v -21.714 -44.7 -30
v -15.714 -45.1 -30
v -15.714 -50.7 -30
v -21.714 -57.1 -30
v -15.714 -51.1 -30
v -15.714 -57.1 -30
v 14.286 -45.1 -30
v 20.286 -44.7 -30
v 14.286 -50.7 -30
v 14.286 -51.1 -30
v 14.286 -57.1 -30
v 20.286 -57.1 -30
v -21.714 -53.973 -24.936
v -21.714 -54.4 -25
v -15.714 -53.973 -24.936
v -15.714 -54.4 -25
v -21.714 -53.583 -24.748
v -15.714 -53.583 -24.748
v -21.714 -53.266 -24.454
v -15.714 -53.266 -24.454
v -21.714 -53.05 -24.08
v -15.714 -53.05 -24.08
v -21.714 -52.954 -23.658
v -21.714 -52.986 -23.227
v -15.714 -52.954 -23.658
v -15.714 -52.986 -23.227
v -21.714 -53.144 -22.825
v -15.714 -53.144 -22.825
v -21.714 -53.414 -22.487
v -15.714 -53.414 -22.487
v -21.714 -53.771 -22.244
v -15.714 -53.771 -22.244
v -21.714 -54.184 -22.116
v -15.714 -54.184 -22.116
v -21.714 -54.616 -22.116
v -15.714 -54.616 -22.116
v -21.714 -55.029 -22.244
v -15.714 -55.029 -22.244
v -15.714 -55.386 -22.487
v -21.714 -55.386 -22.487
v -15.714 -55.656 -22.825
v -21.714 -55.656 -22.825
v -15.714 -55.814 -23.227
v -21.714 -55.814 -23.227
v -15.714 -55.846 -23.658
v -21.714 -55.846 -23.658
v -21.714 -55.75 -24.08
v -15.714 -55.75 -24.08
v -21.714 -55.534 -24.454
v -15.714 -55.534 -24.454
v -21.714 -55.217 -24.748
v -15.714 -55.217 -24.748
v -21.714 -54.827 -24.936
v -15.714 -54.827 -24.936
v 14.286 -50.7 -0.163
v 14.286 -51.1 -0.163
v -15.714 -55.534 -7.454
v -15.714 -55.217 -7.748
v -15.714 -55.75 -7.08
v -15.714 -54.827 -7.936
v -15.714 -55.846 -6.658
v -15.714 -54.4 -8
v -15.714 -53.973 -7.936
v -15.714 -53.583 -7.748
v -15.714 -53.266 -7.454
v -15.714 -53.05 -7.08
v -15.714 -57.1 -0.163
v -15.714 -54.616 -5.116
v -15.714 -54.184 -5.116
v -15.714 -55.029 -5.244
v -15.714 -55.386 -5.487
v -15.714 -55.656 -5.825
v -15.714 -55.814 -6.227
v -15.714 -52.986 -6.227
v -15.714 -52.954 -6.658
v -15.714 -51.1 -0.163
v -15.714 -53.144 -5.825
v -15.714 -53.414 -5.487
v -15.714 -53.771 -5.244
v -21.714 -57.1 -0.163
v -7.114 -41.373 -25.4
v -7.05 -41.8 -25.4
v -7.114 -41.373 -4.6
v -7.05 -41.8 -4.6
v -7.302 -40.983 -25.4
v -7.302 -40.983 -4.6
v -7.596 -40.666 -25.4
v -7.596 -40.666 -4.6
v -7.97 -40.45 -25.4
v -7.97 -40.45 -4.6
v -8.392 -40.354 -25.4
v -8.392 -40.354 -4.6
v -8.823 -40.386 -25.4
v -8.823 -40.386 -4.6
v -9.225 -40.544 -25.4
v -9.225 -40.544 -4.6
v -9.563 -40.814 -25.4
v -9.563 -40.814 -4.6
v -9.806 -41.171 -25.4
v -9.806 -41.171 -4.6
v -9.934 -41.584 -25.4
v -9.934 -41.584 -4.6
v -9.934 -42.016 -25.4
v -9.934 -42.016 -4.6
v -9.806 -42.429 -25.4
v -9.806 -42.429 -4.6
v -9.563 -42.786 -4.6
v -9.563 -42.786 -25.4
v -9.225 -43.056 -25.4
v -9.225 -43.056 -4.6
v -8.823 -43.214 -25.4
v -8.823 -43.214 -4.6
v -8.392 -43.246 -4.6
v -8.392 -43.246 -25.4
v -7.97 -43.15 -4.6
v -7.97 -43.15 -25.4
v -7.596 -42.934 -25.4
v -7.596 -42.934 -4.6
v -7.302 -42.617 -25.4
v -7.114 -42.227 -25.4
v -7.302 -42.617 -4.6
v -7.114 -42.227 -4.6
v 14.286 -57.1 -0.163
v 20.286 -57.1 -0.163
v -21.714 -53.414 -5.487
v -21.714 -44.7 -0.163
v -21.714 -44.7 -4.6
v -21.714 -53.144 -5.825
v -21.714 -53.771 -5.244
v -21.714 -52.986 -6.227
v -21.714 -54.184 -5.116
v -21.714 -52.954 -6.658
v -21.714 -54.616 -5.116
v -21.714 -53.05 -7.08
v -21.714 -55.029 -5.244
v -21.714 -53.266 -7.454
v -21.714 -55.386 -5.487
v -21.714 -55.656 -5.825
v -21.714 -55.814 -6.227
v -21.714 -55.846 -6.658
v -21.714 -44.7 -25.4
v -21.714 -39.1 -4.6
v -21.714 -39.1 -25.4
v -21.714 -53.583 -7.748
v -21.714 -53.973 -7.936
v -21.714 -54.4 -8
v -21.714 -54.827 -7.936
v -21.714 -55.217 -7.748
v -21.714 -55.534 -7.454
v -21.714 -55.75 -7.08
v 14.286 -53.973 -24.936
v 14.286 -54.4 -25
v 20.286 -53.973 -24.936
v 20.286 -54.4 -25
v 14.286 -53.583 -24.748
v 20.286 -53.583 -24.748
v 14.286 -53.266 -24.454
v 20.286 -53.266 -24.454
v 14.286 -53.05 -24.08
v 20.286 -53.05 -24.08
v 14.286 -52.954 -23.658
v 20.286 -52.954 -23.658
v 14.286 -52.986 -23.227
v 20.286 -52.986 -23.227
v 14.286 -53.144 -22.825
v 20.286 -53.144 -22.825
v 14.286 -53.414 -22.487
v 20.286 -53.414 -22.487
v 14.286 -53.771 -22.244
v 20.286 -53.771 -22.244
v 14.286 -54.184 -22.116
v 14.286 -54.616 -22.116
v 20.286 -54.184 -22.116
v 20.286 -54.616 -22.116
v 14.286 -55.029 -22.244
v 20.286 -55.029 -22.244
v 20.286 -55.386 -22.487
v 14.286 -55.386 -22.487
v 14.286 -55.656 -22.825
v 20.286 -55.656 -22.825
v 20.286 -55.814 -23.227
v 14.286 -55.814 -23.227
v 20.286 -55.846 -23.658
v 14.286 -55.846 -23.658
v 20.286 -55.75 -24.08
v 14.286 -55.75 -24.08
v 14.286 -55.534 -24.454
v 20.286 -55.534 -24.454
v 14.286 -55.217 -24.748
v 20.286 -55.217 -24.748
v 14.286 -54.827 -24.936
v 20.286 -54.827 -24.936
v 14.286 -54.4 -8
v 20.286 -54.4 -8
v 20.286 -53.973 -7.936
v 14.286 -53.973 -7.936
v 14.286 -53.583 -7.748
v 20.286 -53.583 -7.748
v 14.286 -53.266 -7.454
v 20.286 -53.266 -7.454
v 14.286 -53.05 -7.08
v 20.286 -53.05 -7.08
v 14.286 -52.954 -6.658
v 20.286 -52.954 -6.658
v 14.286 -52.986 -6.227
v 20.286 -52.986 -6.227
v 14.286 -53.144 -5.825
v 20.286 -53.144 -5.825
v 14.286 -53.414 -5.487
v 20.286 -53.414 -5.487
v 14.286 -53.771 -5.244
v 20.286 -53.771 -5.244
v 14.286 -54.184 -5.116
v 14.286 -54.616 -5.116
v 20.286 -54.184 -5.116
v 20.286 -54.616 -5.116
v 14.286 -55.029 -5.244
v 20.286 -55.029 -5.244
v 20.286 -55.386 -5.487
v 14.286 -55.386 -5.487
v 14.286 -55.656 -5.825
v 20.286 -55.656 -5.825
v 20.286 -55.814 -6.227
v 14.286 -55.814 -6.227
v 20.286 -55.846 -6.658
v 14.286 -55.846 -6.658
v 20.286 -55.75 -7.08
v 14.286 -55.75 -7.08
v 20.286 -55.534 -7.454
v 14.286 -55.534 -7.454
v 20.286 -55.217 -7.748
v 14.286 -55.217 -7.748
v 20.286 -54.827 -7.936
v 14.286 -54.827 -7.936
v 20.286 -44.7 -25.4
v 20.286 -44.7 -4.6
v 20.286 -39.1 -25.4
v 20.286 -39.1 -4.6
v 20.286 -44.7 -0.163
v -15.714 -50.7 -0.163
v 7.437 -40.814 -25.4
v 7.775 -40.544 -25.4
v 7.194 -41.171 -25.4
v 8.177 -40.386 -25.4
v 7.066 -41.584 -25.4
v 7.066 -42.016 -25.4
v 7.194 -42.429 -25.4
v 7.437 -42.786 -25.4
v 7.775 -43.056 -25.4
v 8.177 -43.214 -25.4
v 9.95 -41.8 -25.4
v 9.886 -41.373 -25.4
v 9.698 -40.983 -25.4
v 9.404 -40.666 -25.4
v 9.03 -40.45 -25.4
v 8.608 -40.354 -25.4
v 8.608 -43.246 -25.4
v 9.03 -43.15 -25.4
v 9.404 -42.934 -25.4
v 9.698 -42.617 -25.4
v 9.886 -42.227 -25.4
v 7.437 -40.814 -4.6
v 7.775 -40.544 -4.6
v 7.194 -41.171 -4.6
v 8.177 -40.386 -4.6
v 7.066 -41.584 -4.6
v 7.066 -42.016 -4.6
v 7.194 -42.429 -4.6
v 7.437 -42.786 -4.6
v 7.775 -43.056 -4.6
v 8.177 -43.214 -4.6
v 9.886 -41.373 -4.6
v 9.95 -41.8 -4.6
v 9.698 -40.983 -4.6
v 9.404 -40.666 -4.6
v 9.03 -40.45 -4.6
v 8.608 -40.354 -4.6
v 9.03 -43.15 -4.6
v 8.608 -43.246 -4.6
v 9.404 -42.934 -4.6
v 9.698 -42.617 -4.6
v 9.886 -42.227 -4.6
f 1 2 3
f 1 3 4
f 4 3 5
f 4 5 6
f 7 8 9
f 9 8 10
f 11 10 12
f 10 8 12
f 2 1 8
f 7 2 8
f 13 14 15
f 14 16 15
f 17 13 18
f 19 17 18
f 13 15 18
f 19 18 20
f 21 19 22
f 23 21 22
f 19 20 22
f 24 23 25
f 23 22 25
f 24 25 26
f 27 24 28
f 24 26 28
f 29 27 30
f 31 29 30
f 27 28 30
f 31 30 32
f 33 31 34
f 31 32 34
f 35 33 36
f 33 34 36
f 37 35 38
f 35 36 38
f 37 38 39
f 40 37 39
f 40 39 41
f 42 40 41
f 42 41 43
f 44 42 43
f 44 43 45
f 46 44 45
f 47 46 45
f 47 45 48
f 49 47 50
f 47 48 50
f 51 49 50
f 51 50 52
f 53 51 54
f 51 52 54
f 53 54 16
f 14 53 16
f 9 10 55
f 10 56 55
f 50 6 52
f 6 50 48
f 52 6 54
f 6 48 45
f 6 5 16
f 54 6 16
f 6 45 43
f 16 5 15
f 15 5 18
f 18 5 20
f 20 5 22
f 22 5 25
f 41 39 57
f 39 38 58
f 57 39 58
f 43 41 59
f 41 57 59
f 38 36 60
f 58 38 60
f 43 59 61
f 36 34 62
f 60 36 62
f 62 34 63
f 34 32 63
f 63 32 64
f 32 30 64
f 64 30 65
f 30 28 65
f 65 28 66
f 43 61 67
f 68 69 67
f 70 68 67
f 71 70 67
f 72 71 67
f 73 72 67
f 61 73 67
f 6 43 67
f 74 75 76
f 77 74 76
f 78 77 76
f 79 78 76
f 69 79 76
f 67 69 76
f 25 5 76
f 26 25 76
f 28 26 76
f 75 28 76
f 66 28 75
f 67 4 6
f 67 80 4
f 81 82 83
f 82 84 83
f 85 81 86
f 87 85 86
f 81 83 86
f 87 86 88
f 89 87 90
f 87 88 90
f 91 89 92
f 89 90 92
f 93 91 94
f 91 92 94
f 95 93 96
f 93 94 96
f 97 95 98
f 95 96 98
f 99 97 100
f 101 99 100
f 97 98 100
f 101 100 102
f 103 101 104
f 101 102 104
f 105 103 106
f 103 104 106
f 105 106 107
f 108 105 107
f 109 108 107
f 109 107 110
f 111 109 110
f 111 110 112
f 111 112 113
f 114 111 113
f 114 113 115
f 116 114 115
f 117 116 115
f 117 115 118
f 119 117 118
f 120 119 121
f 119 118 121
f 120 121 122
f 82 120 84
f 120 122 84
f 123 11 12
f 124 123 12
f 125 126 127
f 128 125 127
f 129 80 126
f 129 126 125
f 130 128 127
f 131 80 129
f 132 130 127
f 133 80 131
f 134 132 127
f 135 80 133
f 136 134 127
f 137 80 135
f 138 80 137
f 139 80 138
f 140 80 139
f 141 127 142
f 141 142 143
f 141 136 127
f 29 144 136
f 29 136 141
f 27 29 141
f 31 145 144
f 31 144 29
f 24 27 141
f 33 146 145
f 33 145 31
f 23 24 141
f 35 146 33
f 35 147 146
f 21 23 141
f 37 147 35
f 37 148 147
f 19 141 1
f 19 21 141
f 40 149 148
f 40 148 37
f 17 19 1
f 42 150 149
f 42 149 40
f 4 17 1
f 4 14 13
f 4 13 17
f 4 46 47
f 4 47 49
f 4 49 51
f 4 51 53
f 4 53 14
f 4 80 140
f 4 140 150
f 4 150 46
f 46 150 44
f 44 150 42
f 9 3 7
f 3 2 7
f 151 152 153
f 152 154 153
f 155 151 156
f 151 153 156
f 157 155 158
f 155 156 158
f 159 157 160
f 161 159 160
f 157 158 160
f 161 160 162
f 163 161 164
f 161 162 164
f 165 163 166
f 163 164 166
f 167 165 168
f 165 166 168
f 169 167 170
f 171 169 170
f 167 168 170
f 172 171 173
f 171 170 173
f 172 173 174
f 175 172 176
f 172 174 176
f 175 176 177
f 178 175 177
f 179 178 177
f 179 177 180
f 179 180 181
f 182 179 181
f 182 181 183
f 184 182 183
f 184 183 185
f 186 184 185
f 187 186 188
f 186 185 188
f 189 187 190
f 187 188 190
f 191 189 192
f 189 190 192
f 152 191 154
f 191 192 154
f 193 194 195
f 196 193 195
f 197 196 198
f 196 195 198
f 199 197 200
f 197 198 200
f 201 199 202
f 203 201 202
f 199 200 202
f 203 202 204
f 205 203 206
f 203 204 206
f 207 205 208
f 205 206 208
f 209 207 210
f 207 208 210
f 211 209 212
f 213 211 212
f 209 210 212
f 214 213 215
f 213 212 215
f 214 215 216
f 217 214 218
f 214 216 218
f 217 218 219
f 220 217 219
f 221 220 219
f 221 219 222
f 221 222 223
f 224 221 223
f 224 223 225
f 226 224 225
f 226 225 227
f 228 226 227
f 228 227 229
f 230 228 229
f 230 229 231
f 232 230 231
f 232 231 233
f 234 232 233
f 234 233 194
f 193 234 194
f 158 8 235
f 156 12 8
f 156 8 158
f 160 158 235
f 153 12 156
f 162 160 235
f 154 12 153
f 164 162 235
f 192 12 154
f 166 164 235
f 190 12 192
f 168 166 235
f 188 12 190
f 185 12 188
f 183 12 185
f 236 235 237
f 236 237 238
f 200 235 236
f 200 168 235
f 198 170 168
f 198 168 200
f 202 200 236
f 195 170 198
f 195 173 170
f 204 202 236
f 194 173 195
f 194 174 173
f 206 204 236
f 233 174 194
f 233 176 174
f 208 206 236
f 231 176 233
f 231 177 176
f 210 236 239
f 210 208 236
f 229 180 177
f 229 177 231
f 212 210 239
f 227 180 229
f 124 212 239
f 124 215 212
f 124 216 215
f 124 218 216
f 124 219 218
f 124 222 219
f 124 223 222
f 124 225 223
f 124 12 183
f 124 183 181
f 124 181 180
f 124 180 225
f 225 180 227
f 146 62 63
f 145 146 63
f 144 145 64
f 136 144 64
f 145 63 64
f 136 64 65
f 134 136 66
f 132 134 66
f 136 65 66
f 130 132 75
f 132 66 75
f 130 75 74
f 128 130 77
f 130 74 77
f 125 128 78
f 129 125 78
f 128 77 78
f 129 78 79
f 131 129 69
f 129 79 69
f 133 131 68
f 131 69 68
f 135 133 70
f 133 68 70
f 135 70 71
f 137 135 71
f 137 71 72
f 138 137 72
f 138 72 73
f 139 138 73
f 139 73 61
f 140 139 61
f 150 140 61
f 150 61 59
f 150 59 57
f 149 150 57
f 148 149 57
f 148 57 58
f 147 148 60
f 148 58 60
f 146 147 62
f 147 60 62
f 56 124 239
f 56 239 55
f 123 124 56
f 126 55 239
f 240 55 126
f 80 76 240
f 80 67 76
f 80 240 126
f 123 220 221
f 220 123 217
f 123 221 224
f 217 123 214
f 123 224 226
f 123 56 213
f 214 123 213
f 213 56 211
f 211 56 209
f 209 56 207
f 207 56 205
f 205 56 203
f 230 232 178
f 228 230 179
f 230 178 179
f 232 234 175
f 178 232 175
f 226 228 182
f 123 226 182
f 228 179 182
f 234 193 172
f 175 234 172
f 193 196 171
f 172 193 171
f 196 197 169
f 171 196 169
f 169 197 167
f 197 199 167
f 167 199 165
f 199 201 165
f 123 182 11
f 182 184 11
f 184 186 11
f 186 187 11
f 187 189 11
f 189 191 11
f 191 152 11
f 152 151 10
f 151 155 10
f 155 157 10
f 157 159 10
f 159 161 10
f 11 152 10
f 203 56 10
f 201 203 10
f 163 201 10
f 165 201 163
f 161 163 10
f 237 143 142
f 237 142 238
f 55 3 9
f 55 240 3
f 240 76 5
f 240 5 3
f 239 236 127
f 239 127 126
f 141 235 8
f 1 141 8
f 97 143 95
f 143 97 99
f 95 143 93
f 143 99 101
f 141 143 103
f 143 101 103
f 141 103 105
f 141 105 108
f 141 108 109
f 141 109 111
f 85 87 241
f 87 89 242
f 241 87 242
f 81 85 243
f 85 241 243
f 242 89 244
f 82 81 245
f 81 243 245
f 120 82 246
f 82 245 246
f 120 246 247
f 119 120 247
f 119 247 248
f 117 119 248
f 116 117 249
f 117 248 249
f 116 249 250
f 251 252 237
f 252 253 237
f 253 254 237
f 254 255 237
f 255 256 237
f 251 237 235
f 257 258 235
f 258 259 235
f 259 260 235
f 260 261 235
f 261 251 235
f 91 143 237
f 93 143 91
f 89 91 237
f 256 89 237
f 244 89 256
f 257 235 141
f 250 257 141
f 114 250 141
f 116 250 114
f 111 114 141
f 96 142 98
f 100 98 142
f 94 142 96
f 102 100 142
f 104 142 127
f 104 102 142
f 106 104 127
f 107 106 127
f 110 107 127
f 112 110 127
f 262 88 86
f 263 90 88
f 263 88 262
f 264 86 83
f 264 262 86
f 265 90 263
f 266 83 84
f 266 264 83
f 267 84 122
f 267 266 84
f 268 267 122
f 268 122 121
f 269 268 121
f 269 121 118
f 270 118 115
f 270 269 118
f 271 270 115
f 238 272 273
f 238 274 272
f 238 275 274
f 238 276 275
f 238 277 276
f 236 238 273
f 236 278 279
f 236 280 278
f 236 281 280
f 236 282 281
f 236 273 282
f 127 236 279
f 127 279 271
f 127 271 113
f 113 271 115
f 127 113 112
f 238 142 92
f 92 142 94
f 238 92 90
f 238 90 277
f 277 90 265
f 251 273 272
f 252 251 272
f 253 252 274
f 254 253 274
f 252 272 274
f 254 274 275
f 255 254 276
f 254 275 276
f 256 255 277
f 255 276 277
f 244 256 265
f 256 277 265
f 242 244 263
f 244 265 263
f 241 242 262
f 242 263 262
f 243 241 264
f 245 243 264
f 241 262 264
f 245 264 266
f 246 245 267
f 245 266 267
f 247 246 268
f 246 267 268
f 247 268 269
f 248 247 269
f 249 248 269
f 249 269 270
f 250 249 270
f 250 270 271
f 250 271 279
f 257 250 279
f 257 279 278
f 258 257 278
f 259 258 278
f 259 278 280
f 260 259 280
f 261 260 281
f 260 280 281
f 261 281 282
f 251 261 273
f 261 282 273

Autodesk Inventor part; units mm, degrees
ref_plane "YZ Plane" through (0, 0, 0) normal (1, 0, 0) x (0, 1, 0)
ref_plane "XZ Plane" through (0, 0, 0) normal (0, 1, 0) x (-1, 0, 0)
ref_plane "XY Plane" through (0, 0, 0) normal (0, 0, 1) x (1, 0, 0)
ref_plane "작업 평면1" through (0, 0, 0) normal (0, 0, 1) x (1, 0, 0)
sketch "스케치1" plane through (0, 0, 0) normal (0, 0, 1) x (1, 0, 0)
  line L0 (-12.7, 12) -> (-9.2, 12) projected
  line L1 (-12.7, 12) -> (-17.8, 6) projected
  line L2 (-17.8, 6) -> (-17.8, -32.6) projected
  line L3 (-17.8, -32.6) -> (-12.7, -38.6) projected
  line L4 (-12.7, -38.6) -> (12.7, -38.6) projected
  line L5 (12.7, -38.6) -> (17.8, -32.6) projected
  line L6 (17.8, -32.6) -> (17.8, 6) projected
  line L7 (17.8, 6) -> (12.7, 12) projected
  line L8 (9.2, 12) -> (12.7, 12) projected
  arc A0 (12.2, 9) -> (9.2, 12) centre (9.2, 9) ccw projected
  line L9 (12.2, -30) -> (12.2, 9) projected
  arc A1 (9.2, -33) -> (12.2, -30) centre (9.2, -30) ccw projected
  line L10 (-9.2, -33) -> (9.2, -33) projected
  arc A2 (-12.2, -30) -> (-9.2, -33) centre (-9.2, -30) ccw projected
  line L11 (-12.2, 9) -> (-12.2, -30) projected
  arc A3 (-9.2, 12) -> (-12.2, 9) centre (-9.2, 9) ccw projected
  circle A4 centre (-15, 4.5) radius 1.35 projected
  circle A5 centre (-15, -12.5) radius 1.35 projected
  circle A6 centre (-8.5, -35.8) radius 1.35 projected
  circle A7 centre (15, 4.5) radius 1.35 projected
  circle A8 centre (15, -12.5) radius 1.35 projected
  circle A9 centre (8.5, -35.8) radius 1.35 projected
  circle A10 centre (-15, -29.5) radius 1.35 projected
  circle A11 centre (15, -29.5) radius 1.35 projected
  arc A12 (9.2, -33.1) -> (12.3, -30) centre (9.2, -30) ccw
  line L12 (12.3, -30) -> (12.3, 9)
  arc A13 (12.3, 9) -> (10.2954, 11.9) centre (9.2, 9) ccw
  line L13 (10.2954, 11.9) -> (12.6538, 11.9)
  line L14 (12.6538, 11.9) -> (17.7, 5.9632)
  line L15 (17.7, 5.9632) -> (17.7, -32.5632)
  line L16 (17.7, -32.5632) -> (12.6538, -38.5)
  line L17 (12.6538, -38.5) -> (-12.6538, -38.5)
  line L18 (-12.6538, -38.5) -> (-17.7, -32.5632)
  line L19 (-17.7, -32.5632) -> (-17.7, 5.9632)
  line L20 (-17.7, 5.9632) -> (-12.6538, 11.9)
  line L21 (-12.6538, 11.9) -> (-10.2954, 11.9)
  arc A14 (-10.2954, 11.9) -> (-12.3, 9) centre (-9.2, 9) ccw
  line L22 (-12.3, 9) -> (-12.3, -30)
  arc A15 (-12.3, -30) -> (-9.2, -33.1) centre (-9.2, -30) ccw
  line L23 (-9.2, -33.1) -> (9.2, -33.1)
  circle A16 centre (-8.5, -35.8) radius 1.45
  circle A17 centre (8.5, -35.8) radius 1.45
  line L24 (12.6538, -33.1) -> (-12.3462, -33.1)
  line L25 (-12.3462, -33.1) -> (-12.3462, -39.1)
  line L26 (-12.3462, -39.1) -> (12.6538, -39.1)
  line L27 (12.6538, -39.1) -> (12.6538, -33.1)
  point P0 (0, 0)
  point P1 (9.2, -33.1)
  point P2 (-9.2, -33.1)
  dimension "d0" = 0.1
  dimension "d1" = 0.1
  dimension "d2" = 0.1
  dimension "d3" = 25
  dimension "d4" = 6
extrude "돌출1" add sketch "스케치1" along normal blind 6 contours L25 L17 L27 L4 | L4 L27 L26 L25 | L25 L24 L23 L27 L17
ref_plane "작업 평면2" through (0, 0, -30) normal (0, 0, -1) x (-1, 0, 0)
sketch "스케치2" plane through (0, 0, -30) normal (0, 0, -1) x (-1, 0, 0)
  line L0 (-12.6538, -33.1) -> (12.3462, -33.1) projected
  line L1 (12.3462, -33.1) -> (12.3462, -39.1) projected
  line L2 (12.3462, -39.1) -> (-12.6538, -39.1) projected
  line L3 (-12.6538, -39.1) -> (-12.6538, -33.1) projected
  circle A0 centre (8.5, -35.8) radius 1.45 projected
  circle A1 centre (-8.5, -35.8) radius 1.45 projected
  point P0 (0, 0)
extrude "돌출2" add sketch "스케치2" along normal blind 6
sketch "스케치3" plane through (-12.3462, -39.1, -30) normal (0, -1, 0) x (1, 0, 0)
  line L0 (0, 30) -> (25, 30) projected
  line L1 (25, 30) -> (25, 36) projected
  line L2 (0, 36) -> (25, 36) projected
  line L3 (0, 30) -> (0, 36) projected
  line L4 (25, 0) -> (0, 0) projected
  line L5 (0, 0) -> (0, -6) projected
  line L6 (25, -6) -> (0, -6) projected
  line L7 (25, 0) -> (25, -6) projected
  line L8 (25, 36) -> (0, 36)
  line L9 (0, 36) -> (0, -6)
  line L10 (0, -6) -> (25, -6)
  line L11 (25, -6) -> (25, 36)
  point P0 (12.3462, 30)
extrude "돌출3" add sketch "스케치3" along normal blind 6
sketch "스케치5" plane through (-12.3462, -45.1, -30) normal (0, -1, 0) x (1, 0, 0)
  circle A0 centre (11.5825, 20.4065) radius 1.6 projected
  line L0 (26.6325, 7.8369) -> (26.6325, 32.8369) projected
  line L1 (-3.3675, 32.8369) -> (26.6325, 32.8369) projected
  line L2 (-3.3675, 32.8369) -> (-3.3675, 7.8369) projected
  line L3 (26.6325, 7.8369) -> (-3.3675, 7.8369) projected
  line L4 (-3.3675, 7.8369) -> (-3.3675, 32.8369) projected
  line L5 (-3.3675, 32.8369) -> (-9.3675, 32.8369) projected
  line L6 (-9.3675, 7.8369) -> (-9.3675, 32.8369) projected
  line L7 (-3.3675, 7.8369) -> (-9.3675, 7.8369) projected
  line L8 (26.6325, 32.8369) -> (26.6325, 7.8369) projected
  line L9 (26.6325, 7.8369) -> (32.6325, 7.8369) projected
  line L10 (32.6325, 32.8369) -> (32.6325, 7.8369) projected
  line L11 (26.6325, 32.8369) -> (32.6325, 32.8369) projected
  line L12 (32.6325, 7.8369) -> (-9.3675, 7.8369)
  line L13 (-9.3675, 7.8369) -> (-9.3675, 1.8369)
  line L14 (-9.3675, 1.8369) -> (32.6325, 1.8369)
  line L15 (32.6325, 1.8369) -> (32.6325, 7.8369)
  line L16 (26.6325, 7.8369) -> (26.6325, 1.8369)
  line L17 (-3.3675, 7.8369) -> (-3.3675, 1.8369)
  line L18 (32.6325, 1.8369) -> (-9.3675, 1.8369)
  line L19 (-9.3675, 1.8369) -> (-9.3675, -1.1631)
  line L20 (-9.3675, -1.1631) -> (32.6325, -1.1631)
  line L21 (32.6325, -1.1631) -> (32.6325, 1.8369)
  line L22 (-9.3675, 32.8369) -> (32.6325, 32.8369)
  line L23 (32.6325, 32.8369) -> (32.6325, 29.8369)
  line L24 (32.6325, 29.8369) -> (-9.3675, 29.8369)
  line L25 (-9.3675, 29.8369) -> (-9.3675, 32.8369)
  point P0 (12.3462, 30)
  point P1 (-9.3675, 29.8369)
  dimension "d18" = 6
  dimension "d24" = 3
  dimension "d25" = 3
extrude "돌출5" add sketch "스케치5" along normal blind 6 contours A0 | L3 L2 L24 L0 | L16 L14 L17 L3 | L0 L24 L10 L9 | L9 L15 L14 L16 | L7 L6 L24 L2 | L17 L14 L13 L7 | L14 L21 L20 L19
sketch "스케치6" plane through (-12.3462, -51.1, -30) normal (0, -1, 0) x (1, 0, 0)
  line L0 (-3.3675, 7.8369) -> (-3.3675, 32.8369) projected
  line L1 (-3.3675, 32.8369) -> (-9.3675, 32.8369) projected
  line L2 (-9.3675, 7.8369) -> (-9.3675, 32.8369) projected
  line L3 (-3.3675, 7.8369) -> (-9.3675, 7.8369) projected
  line L4 (26.6325, 32.8369) -> (26.6325, 7.8369) construction
  line L5 (26.6325, 7.8369) -> (32.6325, 7.8369) construction
  line L6 (32.6325, 32.8369) -> (32.6325, 7.8369) construction
  line L7 (26.6325, 32.8369) -> (32.6325, 32.8369) construction
  line L8 (26.6325, 32.8369) -> (26.6325, 7.8369) projected
  line L9 (26.6325, 7.8369) -> (32.6325, 7.8369) projected
  line L10 (32.6325, 32.8369) -> (32.6325, 7.8369) projected
  line L11 (26.6325, 32.8369) -> (32.6325, 32.8369) projected
  line L12 (32.6325, -1.1631) -> (32.6325, 29.8369) projected
  line L13 (32.6325, 29.8369) -> (-9.3675, 29.8369) projected
  line L14 (-9.3675, 29.8369) -> (-9.3675, -1.1631) projected
  line L15 (-9.3675, -1.1631) -> (32.6325, -1.1631) projected
  line L16 (-9.3675, 29.8369) -> (-9.3675, -1.1631) projected
  line L17 (-3.3675, 7.8369) -> (-9.3675, 7.8369)
  line L18 (-9.3675, 7.8369) -> (-9.3675, -1.1631)
  line L19 (-9.3675, -1.1631) -> (-3.3675, -1.1631)
  line L20 (-3.3675, -1.1631) -> (-3.3675, 7.8369)
  line L21 (26.6325, 7.8369) -> (32.6325, 7.8369)
  line L22 (32.6325, 7.8369) -> (32.6325, -1.1631)
  line L23 (32.6325, -1.1631) -> (26.6325, -1.1631)
  line L24 (26.6325, -1.1631) -> (26.6325, 7.8369)
  point P0 (-3.3675, 29.8369)
  point P1 (26.6325, 29.8369)
  point P2 (-3.3675, -1.1631)
extrude "돌출6" add sketch "스케치6" along normal blind 6 contours L3 L2 L13 L0 | L20 L15 L14 L3 | L13 L10 L9 L8 | L24 L9 L12 L15
sketch "스케치8" plane through (20.2862, -45.1, -0.1631) normal (1, 0, 0) x (0, 0, -1)
  line L0 (27.5869, -57.1) -> (24.0869, -57.1) projected
  line L1 (27.5869, -57.1) -> (32.6869, -51.1) projected
  line L2 (32.6869, -51.1) -> (32.6869, -12.5) projected
  line L3 (32.6869, -12.5) -> (27.5869, -6.5) projected
  line L4 (27.5869, -6.5) -> (2.1869, -6.5) projected
  line L5 (2.1869, -6.5) -> (-2.9131, -12.5) projected
  line L6 (-2.9131, -12.5) -> (-2.9131, -51.1) projected
  line L7 (-2.9131, -51.1) -> (2.1869, -57.1) projected
  line L8 (5.6869, -57.1) -> (2.1869, -57.1) projected
  arc A0 (2.6869, -54.1) -> (5.6869, -57.1) centre (5.6869, -54.1) ccw projected
  line L9 (2.6869, -15.1) -> (2.6869, -54.1) projected
  arc A1 (5.6869, -12.1) -> (2.6869, -15.1) centre (5.6869, -15.1) ccw projected
  line L10 (24.0869, -12.1) -> (5.6869, -12.1) projected
  arc A2 (27.0869, -15.1) -> (24.0869, -12.1) centre (24.0869, -15.1) ccw projected
  line L11 (27.0869, -54.1) -> (27.0869, -15.1) projected
  arc A3 (24.0869, -57.1) -> (27.0869, -54.1) centre (24.0869, -54.1) ccw projected
  circle A4 centre (29.8869, -49.6) radius 1.35 projected
  circle A5 centre (29.8869, -32.6) radius 1.35 projected
  circle A6 centre (23.3869, -9.3) radius 1.35 projected
  circle A7 centre (-0.1131, -49.6) radius 1.35 projected
  circle A8 centre (-0.1131, -32.6) radius 1.35 projected
  circle A9 centre (6.3869, -9.3) radius 1.35 projected
  circle A10 centre (29.8869, -15.6) radius 1.35 projected
  circle A11 centre (-0.1131, -15.6) radius 1.35 projected
  circle A12 centre (6.3869, -9.3) radius 1.35 projected
  circle A13 centre (6.3869, -9.3) radius 1.45
  circle A14 centre (23.3869, -9.3) radius 1.45
  point P0 (-0.1631, 45.1)
  dimension "d26" = 0.1
  dimension "d27" = 0.1
extrude "돌출8" cut sketch "스케치8" against normal blind 50 contours A6 | A9 | A13 | A14
sketch "스케치9" plane through (-12.3462, -45.1, -30) normal (0, 1, 0) x (1, 0, 0)
  line L0 (25, 1.1631) -> (25, -29.8369) projected
  line L1 (32.6325, -29.8369) -> (25, -29.8369) projected
  line L2 (32.6325, 1.1631) -> (32.6325, -29.8369) projected
  line L3 (25, 1.1631) -> (32.6325, 1.1631) projected
  line L4 (0, -29.8369) -> (0, 1.1631) projected
  line L5 (-9.3675, 1.1631) -> (0, 1.1631) projected
  line L6 (-9.3675, -29.8369) -> (-9.3675, 1.1631) projected
  line L7 (0, -29.8369) -> (-9.3675, -29.8369) projected
  point P0 (12.3462, -30)
extrude "돌출9" add sketch "스케치9" along normal blind 6
sketch "스케치10" plane through (-21.7138, -45.1, -0.1631) normal (0, 0, 1) x (1, 0, 0)
  line L0 (9.3675, 12) -> (9.3675, 0) projected
  line L1 (9.3675, 12) -> (34.3675, 12) projected
  line L2 (34.3675, 12) -> (34.3675, 0) projected
  line L3 (9.3675, 0) -> (34.3675, 0) projected
  circle A0 centre (30.2138, 9.3) radius 1.45 projected
  circle A1 centre (13.2138, 9.3) radius 1.45 projected
  line L4 (34.3675, 0) -> (9.3675, 0) projected
  line L5 (34.3675, 6) -> (34.3675, 0) projected
  line L6 (42, 6) -> (34.3675, 6) projected
  line L7 (42, -12) -> (42, 6) projected
  line L8 (36, -12) -> (42, -12) projected
  line L9 (36, -6) -> (36, -12) projected
  line L10 (6, -6) -> (36, -6) projected
  line L11 (6, -6) -> (6, -12) projected
  line L12 (0, -12) -> (6, -12) projected
  line L13 (0, 6) -> (0, -12) projected
  line L14 (9.3675, 6) -> (0, 6) projected
  line L15 (9.3675, 0) -> (9.3675, 6) projected
  line L16 (6, -6) -> (6, 4.4236)
  line L17 (36, -6) -> (6, -6) projected
  line L18 (36, -6) -> (36, 5.3756)
  line L19 (36, -6) -> (6, -6)
  line L20 (6, -6) -> (6, 0)
  line L21 (6, 0) -> (36, 0)
  line L22 (36, 0) -> (36, -6)
  point P0 (21.7138, 45.1)
  point P1 (36, 0)
extrude "돌출10" cut sketch "스케치10" against normal blind 50 contours L3 L21 L18 L10 L16
sketch "스케치11" plane through (12.6538, -33.1, -30) normal (1, 0, 0) x (0, 0, -1)
  line L0 (0, -6) -> (1.1631, -6) projected
  line L1 (1.1631, -6) -> (1.1631, -12) projected
  line L2 (6, -12) -> (1.1631, -12) projected
  line L3 (6, 0) -> (6, -12) projected
  line L4 (0, 0) -> (6, 0) projected
  line L5 (0, 0) -> (0, -6) projected
  line L6 (-29.8369, -12) -> (-29.8369, -6) projected
  line L7 (-29.8369, -6) -> (-30, -6) projected
  line L8 (-30, -6) -> (-30, 0) projected
  line L9 (-30, 0) -> (-36, 0) projected
  line L10 (-36, 0) -> (-36, -12) projected
  line L11 (-29.8369, -12) -> (-36, -12) projected
  line L12 (-29.8369, -12) -> (-29.8369, -6) projected
  line L13 (-29.8369, -6) -> (-30, -6) projected
  line L14 (-30, -6) -> (-30, 0) projected
  line L15 (-30, 0) -> (-36, 0) projected
  line L16 (-36, 0) -> (-36, -12) projected
  line L17 (-29.8369, -12) -> (-36, -12) projected
  line L18 (0, -6) -> (1.1631, -6) projected
  line L19 (1.1631, -6) -> (1.1631, -12) projected
  line L20 (6, -12) -> (1.1631, -12) projected
  line L21 (6, 0) -> (6, -12) projected
  line L22 (0, 0) -> (6, 0) projected
  line L23 (0, 0) -> (0, -6) projected
  point P0 (-30, 33.1)
extrude "돌출11" cut sketch "스케치11" against normal blind 50
sketch "스케치12" plane through (20.2862, -39.1, -0.1631) normal (1, 0, 0) x (0, 0, -1)
  line L0 (29.8369, -5.5) -> (29.8369, 0.5) projected
  line L1 (4.3369, -5.5) -> (4.3369, -0.375) projected
  line L2 (29.8369, 0.5) -> (29.8369, -18)
  line L3 (0, -18) -> (31, -18) projected
  circle A0 centre (6.3869, -15.3) radius 1.45 projected
  circle A1 centre (23.3869, -15.3) radius 1.45 projected
  line L4 (0, 0) -> (0, -18) projected
  line L5 (31, -18) -> (0, -18) projected
  line L6 (31, -18) -> (31, 0) projected
  line L7 (0, 0) -> (31, 0) projected
  point P0 (-0.1631, 39.1)
  point P1 (29.8369, 0)
extrude "돌출12" cut sketch "스케치12" against normal blind 50 contours L0 L7 L6 L3 L2
sketch "스케치13" plane through (20.2862, -57.1, -0.1631) normal (1, 0, 0) x (0, 0, -1)
  line L0 (29.8369, 12.5) -> (29.8369, 18.5) projected
  line L1 (29.8369, 0) -> (29.8369, 18) projected
  line L2 (4.3369, 12.5) -> (4.3369, 17.625) projected
  line L3 (-0.1631, 12.5) -> (-0.1631, 18.5) projected
  line L4 (0, 18) -> (0, 0) projected
  line L5 (4.3369, 12.5) -> (4.3369, 17.625) projected
  line L6 (4.3369, 12.5) -> (4.3369, 17.625) projected
  line L7 (4.3369, 12.5) -> (4.3369, 17.625) projected
  line L8 (4.3369, 18.1) -> (25.3369, 18.1) projected
  line L9 (4.4369, 18.5) -> (4.4369, 23.625)
  line L10 (4.3369, 18) -> (25.3369, 18)
  line L11 (25.3369, 12.5) -> (25.3369, 17.625) projected
  line L12 (25.2369, 18.5) -> (25.2369, 23.625)
  line L13 (4.4369, 18.5) -> (4.4369, 18)
  line L14 (29.8369, 18) -> (0, 18) projected
  line L15 (4.4369, 18) -> (4.4369, 12.4)
  line L16 (4.4369, 12.4) -> (0, 12.4)
  line L17 (25.2369, 18.5) -> (25.2369, 18)
  line L18 (25.2369, 18) -> (25.2369, 12.4)
  line L19 (25.2369, 12.4) -> (29.8369, 12.4)
  point P0 (-0.1631, 57.1)
  dimension "d38" = 0.1
  dimension "d39" = 0.1
  dimension "d40" = 0.1
  dimension "d41" = 5.6
  dimension "d42" = 5.6
extrude "돌출13" cut sketch "스케치13" against normal blind 50 contours L1 L19 L18 L10 L14 L0 | L15 L16 L4 L14 L10
sketch "스케치14" plane through (20.2862, -44.7, -4.6) normal (0, 0, 1) x (1, 0, 0)
  line L0 (-32.9862, 50.7) -> (-29.4862, 50.7) projected
  line L1 (-32.9862, 50.7) -> (-38.0862, 44.7) projected
  line L2 (-38.0862, 44.7) -> (-38.0862, 6.1) projected
  line L3 (-38.0862, 6.1) -> (-32.9862, 0.1) projected
  line L4 (-32.9862, 0.1) -> (-7.5862, 0.1) projected
  line L5 (-7.5862, 0.1) -> (-2.4862, 6.1) projected
  line L6 (-2.4862, 6.1) -> (-2.4862, 44.7) projected
  line L7 (-2.4862, 44.7) -> (-7.5862, 50.7) projected
  line L8 (-11.0862, 50.7) -> (-7.5862, 50.7) projected
  arc A0 (-8.0862, 47.7) -> (-11.0862, 50.7) centre (-11.0862, 47.7) ccw projected
  line L9 (-8.0862, 8.7) -> (-8.0862, 47.7) projected
  arc A1 (-11.0862, 5.7) -> (-8.0862, 8.7) centre (-11.0862, 8.7) ccw projected
  line L10 (-29.4862, 5.7) -> (-11.0862, 5.7) projected
  arc A2 (-32.4862, 8.7) -> (-29.4862, 5.7) centre (-29.4862, 8.7) ccw projected
  line L11 (-32.4862, 47.7) -> (-32.4862, 8.7) projected
  arc A3 (-29.4862, 50.7) -> (-32.4862, 47.7) centre (-29.4862, 47.7) ccw projected
  circle A4 centre (-35.2862, 43.2) radius 1.35 projected
  circle A5 centre (-35.2862, 26.2) radius 1.35 projected
  circle A6 centre (-28.7862, 2.9) radius 1.35 projected
  circle A7 centre (-5.2862, 43.2) radius 1.35 projected
  circle A8 centre (-5.2862, 26.2) radius 1.35 projected
  circle A9 centre (-11.7862, 2.9) radius 1.35 projected
  circle A10 centre (-35.2862, 9.2) radius 1.35 projected
  circle A11 centre (-5.2862, 9.2) radius 1.35 projected
  circle A12 centre (-11.7862, 2.9) radius 1.45
  circle A13 centre (-28.7862, 2.9) radius 1.45
  dimension "d48" = 0.1
  dimension "d49" = 0.1
sketch "스케치15" plane through (-15.7138, -45.1, -0.1631) normal (0, 0, 1) x (1, 0, 0)
  line L0 (36, 0.4) -> (-6, 0.4) projected
  line L1 (-6, 0.4) -> (-6, -12) projected
  line L2 (0, -12) -> (-6, -12) projected
  line L3 (0, -12) -> (0, 0) projected
  line L4 (30, 0) -> (0, 0) projected
  line L5 (30, 0) -> (30, -12) projected
  line L6 (36, -12) -> (30, -12) projected
  line L7 (36, 0.4) -> (36, -12) projected
  line L8 (-6, 0.4) -> (-6, -12) projected
  line L9 (36, 0.4) -> (-6, 0.4)
  line L10 (-6, 0.4) -> (-6, -5.6)
  line L11 (-6, -5.6) -> (36, -5.6)
  line L12 (36, -5.6) -> (36, 0.4)
  point P0 (15.7138, 45.1)
  point P1 (36, -5.6)
  point P2 (-6, -5.6)
  dimension "d45" = 6
extrude "돌출14" add sketch "스케치15" against normal blind 29.837 contours L7 L11 L5 L4 L3 L1 L0 | L11 L3 L4 L5
extrude "돌출15" cut sketch "스케치14" against normal blind 29.837 contours A6 | A9 | A12 | A13
properties part number "39" material "LCP 플라스틱"
